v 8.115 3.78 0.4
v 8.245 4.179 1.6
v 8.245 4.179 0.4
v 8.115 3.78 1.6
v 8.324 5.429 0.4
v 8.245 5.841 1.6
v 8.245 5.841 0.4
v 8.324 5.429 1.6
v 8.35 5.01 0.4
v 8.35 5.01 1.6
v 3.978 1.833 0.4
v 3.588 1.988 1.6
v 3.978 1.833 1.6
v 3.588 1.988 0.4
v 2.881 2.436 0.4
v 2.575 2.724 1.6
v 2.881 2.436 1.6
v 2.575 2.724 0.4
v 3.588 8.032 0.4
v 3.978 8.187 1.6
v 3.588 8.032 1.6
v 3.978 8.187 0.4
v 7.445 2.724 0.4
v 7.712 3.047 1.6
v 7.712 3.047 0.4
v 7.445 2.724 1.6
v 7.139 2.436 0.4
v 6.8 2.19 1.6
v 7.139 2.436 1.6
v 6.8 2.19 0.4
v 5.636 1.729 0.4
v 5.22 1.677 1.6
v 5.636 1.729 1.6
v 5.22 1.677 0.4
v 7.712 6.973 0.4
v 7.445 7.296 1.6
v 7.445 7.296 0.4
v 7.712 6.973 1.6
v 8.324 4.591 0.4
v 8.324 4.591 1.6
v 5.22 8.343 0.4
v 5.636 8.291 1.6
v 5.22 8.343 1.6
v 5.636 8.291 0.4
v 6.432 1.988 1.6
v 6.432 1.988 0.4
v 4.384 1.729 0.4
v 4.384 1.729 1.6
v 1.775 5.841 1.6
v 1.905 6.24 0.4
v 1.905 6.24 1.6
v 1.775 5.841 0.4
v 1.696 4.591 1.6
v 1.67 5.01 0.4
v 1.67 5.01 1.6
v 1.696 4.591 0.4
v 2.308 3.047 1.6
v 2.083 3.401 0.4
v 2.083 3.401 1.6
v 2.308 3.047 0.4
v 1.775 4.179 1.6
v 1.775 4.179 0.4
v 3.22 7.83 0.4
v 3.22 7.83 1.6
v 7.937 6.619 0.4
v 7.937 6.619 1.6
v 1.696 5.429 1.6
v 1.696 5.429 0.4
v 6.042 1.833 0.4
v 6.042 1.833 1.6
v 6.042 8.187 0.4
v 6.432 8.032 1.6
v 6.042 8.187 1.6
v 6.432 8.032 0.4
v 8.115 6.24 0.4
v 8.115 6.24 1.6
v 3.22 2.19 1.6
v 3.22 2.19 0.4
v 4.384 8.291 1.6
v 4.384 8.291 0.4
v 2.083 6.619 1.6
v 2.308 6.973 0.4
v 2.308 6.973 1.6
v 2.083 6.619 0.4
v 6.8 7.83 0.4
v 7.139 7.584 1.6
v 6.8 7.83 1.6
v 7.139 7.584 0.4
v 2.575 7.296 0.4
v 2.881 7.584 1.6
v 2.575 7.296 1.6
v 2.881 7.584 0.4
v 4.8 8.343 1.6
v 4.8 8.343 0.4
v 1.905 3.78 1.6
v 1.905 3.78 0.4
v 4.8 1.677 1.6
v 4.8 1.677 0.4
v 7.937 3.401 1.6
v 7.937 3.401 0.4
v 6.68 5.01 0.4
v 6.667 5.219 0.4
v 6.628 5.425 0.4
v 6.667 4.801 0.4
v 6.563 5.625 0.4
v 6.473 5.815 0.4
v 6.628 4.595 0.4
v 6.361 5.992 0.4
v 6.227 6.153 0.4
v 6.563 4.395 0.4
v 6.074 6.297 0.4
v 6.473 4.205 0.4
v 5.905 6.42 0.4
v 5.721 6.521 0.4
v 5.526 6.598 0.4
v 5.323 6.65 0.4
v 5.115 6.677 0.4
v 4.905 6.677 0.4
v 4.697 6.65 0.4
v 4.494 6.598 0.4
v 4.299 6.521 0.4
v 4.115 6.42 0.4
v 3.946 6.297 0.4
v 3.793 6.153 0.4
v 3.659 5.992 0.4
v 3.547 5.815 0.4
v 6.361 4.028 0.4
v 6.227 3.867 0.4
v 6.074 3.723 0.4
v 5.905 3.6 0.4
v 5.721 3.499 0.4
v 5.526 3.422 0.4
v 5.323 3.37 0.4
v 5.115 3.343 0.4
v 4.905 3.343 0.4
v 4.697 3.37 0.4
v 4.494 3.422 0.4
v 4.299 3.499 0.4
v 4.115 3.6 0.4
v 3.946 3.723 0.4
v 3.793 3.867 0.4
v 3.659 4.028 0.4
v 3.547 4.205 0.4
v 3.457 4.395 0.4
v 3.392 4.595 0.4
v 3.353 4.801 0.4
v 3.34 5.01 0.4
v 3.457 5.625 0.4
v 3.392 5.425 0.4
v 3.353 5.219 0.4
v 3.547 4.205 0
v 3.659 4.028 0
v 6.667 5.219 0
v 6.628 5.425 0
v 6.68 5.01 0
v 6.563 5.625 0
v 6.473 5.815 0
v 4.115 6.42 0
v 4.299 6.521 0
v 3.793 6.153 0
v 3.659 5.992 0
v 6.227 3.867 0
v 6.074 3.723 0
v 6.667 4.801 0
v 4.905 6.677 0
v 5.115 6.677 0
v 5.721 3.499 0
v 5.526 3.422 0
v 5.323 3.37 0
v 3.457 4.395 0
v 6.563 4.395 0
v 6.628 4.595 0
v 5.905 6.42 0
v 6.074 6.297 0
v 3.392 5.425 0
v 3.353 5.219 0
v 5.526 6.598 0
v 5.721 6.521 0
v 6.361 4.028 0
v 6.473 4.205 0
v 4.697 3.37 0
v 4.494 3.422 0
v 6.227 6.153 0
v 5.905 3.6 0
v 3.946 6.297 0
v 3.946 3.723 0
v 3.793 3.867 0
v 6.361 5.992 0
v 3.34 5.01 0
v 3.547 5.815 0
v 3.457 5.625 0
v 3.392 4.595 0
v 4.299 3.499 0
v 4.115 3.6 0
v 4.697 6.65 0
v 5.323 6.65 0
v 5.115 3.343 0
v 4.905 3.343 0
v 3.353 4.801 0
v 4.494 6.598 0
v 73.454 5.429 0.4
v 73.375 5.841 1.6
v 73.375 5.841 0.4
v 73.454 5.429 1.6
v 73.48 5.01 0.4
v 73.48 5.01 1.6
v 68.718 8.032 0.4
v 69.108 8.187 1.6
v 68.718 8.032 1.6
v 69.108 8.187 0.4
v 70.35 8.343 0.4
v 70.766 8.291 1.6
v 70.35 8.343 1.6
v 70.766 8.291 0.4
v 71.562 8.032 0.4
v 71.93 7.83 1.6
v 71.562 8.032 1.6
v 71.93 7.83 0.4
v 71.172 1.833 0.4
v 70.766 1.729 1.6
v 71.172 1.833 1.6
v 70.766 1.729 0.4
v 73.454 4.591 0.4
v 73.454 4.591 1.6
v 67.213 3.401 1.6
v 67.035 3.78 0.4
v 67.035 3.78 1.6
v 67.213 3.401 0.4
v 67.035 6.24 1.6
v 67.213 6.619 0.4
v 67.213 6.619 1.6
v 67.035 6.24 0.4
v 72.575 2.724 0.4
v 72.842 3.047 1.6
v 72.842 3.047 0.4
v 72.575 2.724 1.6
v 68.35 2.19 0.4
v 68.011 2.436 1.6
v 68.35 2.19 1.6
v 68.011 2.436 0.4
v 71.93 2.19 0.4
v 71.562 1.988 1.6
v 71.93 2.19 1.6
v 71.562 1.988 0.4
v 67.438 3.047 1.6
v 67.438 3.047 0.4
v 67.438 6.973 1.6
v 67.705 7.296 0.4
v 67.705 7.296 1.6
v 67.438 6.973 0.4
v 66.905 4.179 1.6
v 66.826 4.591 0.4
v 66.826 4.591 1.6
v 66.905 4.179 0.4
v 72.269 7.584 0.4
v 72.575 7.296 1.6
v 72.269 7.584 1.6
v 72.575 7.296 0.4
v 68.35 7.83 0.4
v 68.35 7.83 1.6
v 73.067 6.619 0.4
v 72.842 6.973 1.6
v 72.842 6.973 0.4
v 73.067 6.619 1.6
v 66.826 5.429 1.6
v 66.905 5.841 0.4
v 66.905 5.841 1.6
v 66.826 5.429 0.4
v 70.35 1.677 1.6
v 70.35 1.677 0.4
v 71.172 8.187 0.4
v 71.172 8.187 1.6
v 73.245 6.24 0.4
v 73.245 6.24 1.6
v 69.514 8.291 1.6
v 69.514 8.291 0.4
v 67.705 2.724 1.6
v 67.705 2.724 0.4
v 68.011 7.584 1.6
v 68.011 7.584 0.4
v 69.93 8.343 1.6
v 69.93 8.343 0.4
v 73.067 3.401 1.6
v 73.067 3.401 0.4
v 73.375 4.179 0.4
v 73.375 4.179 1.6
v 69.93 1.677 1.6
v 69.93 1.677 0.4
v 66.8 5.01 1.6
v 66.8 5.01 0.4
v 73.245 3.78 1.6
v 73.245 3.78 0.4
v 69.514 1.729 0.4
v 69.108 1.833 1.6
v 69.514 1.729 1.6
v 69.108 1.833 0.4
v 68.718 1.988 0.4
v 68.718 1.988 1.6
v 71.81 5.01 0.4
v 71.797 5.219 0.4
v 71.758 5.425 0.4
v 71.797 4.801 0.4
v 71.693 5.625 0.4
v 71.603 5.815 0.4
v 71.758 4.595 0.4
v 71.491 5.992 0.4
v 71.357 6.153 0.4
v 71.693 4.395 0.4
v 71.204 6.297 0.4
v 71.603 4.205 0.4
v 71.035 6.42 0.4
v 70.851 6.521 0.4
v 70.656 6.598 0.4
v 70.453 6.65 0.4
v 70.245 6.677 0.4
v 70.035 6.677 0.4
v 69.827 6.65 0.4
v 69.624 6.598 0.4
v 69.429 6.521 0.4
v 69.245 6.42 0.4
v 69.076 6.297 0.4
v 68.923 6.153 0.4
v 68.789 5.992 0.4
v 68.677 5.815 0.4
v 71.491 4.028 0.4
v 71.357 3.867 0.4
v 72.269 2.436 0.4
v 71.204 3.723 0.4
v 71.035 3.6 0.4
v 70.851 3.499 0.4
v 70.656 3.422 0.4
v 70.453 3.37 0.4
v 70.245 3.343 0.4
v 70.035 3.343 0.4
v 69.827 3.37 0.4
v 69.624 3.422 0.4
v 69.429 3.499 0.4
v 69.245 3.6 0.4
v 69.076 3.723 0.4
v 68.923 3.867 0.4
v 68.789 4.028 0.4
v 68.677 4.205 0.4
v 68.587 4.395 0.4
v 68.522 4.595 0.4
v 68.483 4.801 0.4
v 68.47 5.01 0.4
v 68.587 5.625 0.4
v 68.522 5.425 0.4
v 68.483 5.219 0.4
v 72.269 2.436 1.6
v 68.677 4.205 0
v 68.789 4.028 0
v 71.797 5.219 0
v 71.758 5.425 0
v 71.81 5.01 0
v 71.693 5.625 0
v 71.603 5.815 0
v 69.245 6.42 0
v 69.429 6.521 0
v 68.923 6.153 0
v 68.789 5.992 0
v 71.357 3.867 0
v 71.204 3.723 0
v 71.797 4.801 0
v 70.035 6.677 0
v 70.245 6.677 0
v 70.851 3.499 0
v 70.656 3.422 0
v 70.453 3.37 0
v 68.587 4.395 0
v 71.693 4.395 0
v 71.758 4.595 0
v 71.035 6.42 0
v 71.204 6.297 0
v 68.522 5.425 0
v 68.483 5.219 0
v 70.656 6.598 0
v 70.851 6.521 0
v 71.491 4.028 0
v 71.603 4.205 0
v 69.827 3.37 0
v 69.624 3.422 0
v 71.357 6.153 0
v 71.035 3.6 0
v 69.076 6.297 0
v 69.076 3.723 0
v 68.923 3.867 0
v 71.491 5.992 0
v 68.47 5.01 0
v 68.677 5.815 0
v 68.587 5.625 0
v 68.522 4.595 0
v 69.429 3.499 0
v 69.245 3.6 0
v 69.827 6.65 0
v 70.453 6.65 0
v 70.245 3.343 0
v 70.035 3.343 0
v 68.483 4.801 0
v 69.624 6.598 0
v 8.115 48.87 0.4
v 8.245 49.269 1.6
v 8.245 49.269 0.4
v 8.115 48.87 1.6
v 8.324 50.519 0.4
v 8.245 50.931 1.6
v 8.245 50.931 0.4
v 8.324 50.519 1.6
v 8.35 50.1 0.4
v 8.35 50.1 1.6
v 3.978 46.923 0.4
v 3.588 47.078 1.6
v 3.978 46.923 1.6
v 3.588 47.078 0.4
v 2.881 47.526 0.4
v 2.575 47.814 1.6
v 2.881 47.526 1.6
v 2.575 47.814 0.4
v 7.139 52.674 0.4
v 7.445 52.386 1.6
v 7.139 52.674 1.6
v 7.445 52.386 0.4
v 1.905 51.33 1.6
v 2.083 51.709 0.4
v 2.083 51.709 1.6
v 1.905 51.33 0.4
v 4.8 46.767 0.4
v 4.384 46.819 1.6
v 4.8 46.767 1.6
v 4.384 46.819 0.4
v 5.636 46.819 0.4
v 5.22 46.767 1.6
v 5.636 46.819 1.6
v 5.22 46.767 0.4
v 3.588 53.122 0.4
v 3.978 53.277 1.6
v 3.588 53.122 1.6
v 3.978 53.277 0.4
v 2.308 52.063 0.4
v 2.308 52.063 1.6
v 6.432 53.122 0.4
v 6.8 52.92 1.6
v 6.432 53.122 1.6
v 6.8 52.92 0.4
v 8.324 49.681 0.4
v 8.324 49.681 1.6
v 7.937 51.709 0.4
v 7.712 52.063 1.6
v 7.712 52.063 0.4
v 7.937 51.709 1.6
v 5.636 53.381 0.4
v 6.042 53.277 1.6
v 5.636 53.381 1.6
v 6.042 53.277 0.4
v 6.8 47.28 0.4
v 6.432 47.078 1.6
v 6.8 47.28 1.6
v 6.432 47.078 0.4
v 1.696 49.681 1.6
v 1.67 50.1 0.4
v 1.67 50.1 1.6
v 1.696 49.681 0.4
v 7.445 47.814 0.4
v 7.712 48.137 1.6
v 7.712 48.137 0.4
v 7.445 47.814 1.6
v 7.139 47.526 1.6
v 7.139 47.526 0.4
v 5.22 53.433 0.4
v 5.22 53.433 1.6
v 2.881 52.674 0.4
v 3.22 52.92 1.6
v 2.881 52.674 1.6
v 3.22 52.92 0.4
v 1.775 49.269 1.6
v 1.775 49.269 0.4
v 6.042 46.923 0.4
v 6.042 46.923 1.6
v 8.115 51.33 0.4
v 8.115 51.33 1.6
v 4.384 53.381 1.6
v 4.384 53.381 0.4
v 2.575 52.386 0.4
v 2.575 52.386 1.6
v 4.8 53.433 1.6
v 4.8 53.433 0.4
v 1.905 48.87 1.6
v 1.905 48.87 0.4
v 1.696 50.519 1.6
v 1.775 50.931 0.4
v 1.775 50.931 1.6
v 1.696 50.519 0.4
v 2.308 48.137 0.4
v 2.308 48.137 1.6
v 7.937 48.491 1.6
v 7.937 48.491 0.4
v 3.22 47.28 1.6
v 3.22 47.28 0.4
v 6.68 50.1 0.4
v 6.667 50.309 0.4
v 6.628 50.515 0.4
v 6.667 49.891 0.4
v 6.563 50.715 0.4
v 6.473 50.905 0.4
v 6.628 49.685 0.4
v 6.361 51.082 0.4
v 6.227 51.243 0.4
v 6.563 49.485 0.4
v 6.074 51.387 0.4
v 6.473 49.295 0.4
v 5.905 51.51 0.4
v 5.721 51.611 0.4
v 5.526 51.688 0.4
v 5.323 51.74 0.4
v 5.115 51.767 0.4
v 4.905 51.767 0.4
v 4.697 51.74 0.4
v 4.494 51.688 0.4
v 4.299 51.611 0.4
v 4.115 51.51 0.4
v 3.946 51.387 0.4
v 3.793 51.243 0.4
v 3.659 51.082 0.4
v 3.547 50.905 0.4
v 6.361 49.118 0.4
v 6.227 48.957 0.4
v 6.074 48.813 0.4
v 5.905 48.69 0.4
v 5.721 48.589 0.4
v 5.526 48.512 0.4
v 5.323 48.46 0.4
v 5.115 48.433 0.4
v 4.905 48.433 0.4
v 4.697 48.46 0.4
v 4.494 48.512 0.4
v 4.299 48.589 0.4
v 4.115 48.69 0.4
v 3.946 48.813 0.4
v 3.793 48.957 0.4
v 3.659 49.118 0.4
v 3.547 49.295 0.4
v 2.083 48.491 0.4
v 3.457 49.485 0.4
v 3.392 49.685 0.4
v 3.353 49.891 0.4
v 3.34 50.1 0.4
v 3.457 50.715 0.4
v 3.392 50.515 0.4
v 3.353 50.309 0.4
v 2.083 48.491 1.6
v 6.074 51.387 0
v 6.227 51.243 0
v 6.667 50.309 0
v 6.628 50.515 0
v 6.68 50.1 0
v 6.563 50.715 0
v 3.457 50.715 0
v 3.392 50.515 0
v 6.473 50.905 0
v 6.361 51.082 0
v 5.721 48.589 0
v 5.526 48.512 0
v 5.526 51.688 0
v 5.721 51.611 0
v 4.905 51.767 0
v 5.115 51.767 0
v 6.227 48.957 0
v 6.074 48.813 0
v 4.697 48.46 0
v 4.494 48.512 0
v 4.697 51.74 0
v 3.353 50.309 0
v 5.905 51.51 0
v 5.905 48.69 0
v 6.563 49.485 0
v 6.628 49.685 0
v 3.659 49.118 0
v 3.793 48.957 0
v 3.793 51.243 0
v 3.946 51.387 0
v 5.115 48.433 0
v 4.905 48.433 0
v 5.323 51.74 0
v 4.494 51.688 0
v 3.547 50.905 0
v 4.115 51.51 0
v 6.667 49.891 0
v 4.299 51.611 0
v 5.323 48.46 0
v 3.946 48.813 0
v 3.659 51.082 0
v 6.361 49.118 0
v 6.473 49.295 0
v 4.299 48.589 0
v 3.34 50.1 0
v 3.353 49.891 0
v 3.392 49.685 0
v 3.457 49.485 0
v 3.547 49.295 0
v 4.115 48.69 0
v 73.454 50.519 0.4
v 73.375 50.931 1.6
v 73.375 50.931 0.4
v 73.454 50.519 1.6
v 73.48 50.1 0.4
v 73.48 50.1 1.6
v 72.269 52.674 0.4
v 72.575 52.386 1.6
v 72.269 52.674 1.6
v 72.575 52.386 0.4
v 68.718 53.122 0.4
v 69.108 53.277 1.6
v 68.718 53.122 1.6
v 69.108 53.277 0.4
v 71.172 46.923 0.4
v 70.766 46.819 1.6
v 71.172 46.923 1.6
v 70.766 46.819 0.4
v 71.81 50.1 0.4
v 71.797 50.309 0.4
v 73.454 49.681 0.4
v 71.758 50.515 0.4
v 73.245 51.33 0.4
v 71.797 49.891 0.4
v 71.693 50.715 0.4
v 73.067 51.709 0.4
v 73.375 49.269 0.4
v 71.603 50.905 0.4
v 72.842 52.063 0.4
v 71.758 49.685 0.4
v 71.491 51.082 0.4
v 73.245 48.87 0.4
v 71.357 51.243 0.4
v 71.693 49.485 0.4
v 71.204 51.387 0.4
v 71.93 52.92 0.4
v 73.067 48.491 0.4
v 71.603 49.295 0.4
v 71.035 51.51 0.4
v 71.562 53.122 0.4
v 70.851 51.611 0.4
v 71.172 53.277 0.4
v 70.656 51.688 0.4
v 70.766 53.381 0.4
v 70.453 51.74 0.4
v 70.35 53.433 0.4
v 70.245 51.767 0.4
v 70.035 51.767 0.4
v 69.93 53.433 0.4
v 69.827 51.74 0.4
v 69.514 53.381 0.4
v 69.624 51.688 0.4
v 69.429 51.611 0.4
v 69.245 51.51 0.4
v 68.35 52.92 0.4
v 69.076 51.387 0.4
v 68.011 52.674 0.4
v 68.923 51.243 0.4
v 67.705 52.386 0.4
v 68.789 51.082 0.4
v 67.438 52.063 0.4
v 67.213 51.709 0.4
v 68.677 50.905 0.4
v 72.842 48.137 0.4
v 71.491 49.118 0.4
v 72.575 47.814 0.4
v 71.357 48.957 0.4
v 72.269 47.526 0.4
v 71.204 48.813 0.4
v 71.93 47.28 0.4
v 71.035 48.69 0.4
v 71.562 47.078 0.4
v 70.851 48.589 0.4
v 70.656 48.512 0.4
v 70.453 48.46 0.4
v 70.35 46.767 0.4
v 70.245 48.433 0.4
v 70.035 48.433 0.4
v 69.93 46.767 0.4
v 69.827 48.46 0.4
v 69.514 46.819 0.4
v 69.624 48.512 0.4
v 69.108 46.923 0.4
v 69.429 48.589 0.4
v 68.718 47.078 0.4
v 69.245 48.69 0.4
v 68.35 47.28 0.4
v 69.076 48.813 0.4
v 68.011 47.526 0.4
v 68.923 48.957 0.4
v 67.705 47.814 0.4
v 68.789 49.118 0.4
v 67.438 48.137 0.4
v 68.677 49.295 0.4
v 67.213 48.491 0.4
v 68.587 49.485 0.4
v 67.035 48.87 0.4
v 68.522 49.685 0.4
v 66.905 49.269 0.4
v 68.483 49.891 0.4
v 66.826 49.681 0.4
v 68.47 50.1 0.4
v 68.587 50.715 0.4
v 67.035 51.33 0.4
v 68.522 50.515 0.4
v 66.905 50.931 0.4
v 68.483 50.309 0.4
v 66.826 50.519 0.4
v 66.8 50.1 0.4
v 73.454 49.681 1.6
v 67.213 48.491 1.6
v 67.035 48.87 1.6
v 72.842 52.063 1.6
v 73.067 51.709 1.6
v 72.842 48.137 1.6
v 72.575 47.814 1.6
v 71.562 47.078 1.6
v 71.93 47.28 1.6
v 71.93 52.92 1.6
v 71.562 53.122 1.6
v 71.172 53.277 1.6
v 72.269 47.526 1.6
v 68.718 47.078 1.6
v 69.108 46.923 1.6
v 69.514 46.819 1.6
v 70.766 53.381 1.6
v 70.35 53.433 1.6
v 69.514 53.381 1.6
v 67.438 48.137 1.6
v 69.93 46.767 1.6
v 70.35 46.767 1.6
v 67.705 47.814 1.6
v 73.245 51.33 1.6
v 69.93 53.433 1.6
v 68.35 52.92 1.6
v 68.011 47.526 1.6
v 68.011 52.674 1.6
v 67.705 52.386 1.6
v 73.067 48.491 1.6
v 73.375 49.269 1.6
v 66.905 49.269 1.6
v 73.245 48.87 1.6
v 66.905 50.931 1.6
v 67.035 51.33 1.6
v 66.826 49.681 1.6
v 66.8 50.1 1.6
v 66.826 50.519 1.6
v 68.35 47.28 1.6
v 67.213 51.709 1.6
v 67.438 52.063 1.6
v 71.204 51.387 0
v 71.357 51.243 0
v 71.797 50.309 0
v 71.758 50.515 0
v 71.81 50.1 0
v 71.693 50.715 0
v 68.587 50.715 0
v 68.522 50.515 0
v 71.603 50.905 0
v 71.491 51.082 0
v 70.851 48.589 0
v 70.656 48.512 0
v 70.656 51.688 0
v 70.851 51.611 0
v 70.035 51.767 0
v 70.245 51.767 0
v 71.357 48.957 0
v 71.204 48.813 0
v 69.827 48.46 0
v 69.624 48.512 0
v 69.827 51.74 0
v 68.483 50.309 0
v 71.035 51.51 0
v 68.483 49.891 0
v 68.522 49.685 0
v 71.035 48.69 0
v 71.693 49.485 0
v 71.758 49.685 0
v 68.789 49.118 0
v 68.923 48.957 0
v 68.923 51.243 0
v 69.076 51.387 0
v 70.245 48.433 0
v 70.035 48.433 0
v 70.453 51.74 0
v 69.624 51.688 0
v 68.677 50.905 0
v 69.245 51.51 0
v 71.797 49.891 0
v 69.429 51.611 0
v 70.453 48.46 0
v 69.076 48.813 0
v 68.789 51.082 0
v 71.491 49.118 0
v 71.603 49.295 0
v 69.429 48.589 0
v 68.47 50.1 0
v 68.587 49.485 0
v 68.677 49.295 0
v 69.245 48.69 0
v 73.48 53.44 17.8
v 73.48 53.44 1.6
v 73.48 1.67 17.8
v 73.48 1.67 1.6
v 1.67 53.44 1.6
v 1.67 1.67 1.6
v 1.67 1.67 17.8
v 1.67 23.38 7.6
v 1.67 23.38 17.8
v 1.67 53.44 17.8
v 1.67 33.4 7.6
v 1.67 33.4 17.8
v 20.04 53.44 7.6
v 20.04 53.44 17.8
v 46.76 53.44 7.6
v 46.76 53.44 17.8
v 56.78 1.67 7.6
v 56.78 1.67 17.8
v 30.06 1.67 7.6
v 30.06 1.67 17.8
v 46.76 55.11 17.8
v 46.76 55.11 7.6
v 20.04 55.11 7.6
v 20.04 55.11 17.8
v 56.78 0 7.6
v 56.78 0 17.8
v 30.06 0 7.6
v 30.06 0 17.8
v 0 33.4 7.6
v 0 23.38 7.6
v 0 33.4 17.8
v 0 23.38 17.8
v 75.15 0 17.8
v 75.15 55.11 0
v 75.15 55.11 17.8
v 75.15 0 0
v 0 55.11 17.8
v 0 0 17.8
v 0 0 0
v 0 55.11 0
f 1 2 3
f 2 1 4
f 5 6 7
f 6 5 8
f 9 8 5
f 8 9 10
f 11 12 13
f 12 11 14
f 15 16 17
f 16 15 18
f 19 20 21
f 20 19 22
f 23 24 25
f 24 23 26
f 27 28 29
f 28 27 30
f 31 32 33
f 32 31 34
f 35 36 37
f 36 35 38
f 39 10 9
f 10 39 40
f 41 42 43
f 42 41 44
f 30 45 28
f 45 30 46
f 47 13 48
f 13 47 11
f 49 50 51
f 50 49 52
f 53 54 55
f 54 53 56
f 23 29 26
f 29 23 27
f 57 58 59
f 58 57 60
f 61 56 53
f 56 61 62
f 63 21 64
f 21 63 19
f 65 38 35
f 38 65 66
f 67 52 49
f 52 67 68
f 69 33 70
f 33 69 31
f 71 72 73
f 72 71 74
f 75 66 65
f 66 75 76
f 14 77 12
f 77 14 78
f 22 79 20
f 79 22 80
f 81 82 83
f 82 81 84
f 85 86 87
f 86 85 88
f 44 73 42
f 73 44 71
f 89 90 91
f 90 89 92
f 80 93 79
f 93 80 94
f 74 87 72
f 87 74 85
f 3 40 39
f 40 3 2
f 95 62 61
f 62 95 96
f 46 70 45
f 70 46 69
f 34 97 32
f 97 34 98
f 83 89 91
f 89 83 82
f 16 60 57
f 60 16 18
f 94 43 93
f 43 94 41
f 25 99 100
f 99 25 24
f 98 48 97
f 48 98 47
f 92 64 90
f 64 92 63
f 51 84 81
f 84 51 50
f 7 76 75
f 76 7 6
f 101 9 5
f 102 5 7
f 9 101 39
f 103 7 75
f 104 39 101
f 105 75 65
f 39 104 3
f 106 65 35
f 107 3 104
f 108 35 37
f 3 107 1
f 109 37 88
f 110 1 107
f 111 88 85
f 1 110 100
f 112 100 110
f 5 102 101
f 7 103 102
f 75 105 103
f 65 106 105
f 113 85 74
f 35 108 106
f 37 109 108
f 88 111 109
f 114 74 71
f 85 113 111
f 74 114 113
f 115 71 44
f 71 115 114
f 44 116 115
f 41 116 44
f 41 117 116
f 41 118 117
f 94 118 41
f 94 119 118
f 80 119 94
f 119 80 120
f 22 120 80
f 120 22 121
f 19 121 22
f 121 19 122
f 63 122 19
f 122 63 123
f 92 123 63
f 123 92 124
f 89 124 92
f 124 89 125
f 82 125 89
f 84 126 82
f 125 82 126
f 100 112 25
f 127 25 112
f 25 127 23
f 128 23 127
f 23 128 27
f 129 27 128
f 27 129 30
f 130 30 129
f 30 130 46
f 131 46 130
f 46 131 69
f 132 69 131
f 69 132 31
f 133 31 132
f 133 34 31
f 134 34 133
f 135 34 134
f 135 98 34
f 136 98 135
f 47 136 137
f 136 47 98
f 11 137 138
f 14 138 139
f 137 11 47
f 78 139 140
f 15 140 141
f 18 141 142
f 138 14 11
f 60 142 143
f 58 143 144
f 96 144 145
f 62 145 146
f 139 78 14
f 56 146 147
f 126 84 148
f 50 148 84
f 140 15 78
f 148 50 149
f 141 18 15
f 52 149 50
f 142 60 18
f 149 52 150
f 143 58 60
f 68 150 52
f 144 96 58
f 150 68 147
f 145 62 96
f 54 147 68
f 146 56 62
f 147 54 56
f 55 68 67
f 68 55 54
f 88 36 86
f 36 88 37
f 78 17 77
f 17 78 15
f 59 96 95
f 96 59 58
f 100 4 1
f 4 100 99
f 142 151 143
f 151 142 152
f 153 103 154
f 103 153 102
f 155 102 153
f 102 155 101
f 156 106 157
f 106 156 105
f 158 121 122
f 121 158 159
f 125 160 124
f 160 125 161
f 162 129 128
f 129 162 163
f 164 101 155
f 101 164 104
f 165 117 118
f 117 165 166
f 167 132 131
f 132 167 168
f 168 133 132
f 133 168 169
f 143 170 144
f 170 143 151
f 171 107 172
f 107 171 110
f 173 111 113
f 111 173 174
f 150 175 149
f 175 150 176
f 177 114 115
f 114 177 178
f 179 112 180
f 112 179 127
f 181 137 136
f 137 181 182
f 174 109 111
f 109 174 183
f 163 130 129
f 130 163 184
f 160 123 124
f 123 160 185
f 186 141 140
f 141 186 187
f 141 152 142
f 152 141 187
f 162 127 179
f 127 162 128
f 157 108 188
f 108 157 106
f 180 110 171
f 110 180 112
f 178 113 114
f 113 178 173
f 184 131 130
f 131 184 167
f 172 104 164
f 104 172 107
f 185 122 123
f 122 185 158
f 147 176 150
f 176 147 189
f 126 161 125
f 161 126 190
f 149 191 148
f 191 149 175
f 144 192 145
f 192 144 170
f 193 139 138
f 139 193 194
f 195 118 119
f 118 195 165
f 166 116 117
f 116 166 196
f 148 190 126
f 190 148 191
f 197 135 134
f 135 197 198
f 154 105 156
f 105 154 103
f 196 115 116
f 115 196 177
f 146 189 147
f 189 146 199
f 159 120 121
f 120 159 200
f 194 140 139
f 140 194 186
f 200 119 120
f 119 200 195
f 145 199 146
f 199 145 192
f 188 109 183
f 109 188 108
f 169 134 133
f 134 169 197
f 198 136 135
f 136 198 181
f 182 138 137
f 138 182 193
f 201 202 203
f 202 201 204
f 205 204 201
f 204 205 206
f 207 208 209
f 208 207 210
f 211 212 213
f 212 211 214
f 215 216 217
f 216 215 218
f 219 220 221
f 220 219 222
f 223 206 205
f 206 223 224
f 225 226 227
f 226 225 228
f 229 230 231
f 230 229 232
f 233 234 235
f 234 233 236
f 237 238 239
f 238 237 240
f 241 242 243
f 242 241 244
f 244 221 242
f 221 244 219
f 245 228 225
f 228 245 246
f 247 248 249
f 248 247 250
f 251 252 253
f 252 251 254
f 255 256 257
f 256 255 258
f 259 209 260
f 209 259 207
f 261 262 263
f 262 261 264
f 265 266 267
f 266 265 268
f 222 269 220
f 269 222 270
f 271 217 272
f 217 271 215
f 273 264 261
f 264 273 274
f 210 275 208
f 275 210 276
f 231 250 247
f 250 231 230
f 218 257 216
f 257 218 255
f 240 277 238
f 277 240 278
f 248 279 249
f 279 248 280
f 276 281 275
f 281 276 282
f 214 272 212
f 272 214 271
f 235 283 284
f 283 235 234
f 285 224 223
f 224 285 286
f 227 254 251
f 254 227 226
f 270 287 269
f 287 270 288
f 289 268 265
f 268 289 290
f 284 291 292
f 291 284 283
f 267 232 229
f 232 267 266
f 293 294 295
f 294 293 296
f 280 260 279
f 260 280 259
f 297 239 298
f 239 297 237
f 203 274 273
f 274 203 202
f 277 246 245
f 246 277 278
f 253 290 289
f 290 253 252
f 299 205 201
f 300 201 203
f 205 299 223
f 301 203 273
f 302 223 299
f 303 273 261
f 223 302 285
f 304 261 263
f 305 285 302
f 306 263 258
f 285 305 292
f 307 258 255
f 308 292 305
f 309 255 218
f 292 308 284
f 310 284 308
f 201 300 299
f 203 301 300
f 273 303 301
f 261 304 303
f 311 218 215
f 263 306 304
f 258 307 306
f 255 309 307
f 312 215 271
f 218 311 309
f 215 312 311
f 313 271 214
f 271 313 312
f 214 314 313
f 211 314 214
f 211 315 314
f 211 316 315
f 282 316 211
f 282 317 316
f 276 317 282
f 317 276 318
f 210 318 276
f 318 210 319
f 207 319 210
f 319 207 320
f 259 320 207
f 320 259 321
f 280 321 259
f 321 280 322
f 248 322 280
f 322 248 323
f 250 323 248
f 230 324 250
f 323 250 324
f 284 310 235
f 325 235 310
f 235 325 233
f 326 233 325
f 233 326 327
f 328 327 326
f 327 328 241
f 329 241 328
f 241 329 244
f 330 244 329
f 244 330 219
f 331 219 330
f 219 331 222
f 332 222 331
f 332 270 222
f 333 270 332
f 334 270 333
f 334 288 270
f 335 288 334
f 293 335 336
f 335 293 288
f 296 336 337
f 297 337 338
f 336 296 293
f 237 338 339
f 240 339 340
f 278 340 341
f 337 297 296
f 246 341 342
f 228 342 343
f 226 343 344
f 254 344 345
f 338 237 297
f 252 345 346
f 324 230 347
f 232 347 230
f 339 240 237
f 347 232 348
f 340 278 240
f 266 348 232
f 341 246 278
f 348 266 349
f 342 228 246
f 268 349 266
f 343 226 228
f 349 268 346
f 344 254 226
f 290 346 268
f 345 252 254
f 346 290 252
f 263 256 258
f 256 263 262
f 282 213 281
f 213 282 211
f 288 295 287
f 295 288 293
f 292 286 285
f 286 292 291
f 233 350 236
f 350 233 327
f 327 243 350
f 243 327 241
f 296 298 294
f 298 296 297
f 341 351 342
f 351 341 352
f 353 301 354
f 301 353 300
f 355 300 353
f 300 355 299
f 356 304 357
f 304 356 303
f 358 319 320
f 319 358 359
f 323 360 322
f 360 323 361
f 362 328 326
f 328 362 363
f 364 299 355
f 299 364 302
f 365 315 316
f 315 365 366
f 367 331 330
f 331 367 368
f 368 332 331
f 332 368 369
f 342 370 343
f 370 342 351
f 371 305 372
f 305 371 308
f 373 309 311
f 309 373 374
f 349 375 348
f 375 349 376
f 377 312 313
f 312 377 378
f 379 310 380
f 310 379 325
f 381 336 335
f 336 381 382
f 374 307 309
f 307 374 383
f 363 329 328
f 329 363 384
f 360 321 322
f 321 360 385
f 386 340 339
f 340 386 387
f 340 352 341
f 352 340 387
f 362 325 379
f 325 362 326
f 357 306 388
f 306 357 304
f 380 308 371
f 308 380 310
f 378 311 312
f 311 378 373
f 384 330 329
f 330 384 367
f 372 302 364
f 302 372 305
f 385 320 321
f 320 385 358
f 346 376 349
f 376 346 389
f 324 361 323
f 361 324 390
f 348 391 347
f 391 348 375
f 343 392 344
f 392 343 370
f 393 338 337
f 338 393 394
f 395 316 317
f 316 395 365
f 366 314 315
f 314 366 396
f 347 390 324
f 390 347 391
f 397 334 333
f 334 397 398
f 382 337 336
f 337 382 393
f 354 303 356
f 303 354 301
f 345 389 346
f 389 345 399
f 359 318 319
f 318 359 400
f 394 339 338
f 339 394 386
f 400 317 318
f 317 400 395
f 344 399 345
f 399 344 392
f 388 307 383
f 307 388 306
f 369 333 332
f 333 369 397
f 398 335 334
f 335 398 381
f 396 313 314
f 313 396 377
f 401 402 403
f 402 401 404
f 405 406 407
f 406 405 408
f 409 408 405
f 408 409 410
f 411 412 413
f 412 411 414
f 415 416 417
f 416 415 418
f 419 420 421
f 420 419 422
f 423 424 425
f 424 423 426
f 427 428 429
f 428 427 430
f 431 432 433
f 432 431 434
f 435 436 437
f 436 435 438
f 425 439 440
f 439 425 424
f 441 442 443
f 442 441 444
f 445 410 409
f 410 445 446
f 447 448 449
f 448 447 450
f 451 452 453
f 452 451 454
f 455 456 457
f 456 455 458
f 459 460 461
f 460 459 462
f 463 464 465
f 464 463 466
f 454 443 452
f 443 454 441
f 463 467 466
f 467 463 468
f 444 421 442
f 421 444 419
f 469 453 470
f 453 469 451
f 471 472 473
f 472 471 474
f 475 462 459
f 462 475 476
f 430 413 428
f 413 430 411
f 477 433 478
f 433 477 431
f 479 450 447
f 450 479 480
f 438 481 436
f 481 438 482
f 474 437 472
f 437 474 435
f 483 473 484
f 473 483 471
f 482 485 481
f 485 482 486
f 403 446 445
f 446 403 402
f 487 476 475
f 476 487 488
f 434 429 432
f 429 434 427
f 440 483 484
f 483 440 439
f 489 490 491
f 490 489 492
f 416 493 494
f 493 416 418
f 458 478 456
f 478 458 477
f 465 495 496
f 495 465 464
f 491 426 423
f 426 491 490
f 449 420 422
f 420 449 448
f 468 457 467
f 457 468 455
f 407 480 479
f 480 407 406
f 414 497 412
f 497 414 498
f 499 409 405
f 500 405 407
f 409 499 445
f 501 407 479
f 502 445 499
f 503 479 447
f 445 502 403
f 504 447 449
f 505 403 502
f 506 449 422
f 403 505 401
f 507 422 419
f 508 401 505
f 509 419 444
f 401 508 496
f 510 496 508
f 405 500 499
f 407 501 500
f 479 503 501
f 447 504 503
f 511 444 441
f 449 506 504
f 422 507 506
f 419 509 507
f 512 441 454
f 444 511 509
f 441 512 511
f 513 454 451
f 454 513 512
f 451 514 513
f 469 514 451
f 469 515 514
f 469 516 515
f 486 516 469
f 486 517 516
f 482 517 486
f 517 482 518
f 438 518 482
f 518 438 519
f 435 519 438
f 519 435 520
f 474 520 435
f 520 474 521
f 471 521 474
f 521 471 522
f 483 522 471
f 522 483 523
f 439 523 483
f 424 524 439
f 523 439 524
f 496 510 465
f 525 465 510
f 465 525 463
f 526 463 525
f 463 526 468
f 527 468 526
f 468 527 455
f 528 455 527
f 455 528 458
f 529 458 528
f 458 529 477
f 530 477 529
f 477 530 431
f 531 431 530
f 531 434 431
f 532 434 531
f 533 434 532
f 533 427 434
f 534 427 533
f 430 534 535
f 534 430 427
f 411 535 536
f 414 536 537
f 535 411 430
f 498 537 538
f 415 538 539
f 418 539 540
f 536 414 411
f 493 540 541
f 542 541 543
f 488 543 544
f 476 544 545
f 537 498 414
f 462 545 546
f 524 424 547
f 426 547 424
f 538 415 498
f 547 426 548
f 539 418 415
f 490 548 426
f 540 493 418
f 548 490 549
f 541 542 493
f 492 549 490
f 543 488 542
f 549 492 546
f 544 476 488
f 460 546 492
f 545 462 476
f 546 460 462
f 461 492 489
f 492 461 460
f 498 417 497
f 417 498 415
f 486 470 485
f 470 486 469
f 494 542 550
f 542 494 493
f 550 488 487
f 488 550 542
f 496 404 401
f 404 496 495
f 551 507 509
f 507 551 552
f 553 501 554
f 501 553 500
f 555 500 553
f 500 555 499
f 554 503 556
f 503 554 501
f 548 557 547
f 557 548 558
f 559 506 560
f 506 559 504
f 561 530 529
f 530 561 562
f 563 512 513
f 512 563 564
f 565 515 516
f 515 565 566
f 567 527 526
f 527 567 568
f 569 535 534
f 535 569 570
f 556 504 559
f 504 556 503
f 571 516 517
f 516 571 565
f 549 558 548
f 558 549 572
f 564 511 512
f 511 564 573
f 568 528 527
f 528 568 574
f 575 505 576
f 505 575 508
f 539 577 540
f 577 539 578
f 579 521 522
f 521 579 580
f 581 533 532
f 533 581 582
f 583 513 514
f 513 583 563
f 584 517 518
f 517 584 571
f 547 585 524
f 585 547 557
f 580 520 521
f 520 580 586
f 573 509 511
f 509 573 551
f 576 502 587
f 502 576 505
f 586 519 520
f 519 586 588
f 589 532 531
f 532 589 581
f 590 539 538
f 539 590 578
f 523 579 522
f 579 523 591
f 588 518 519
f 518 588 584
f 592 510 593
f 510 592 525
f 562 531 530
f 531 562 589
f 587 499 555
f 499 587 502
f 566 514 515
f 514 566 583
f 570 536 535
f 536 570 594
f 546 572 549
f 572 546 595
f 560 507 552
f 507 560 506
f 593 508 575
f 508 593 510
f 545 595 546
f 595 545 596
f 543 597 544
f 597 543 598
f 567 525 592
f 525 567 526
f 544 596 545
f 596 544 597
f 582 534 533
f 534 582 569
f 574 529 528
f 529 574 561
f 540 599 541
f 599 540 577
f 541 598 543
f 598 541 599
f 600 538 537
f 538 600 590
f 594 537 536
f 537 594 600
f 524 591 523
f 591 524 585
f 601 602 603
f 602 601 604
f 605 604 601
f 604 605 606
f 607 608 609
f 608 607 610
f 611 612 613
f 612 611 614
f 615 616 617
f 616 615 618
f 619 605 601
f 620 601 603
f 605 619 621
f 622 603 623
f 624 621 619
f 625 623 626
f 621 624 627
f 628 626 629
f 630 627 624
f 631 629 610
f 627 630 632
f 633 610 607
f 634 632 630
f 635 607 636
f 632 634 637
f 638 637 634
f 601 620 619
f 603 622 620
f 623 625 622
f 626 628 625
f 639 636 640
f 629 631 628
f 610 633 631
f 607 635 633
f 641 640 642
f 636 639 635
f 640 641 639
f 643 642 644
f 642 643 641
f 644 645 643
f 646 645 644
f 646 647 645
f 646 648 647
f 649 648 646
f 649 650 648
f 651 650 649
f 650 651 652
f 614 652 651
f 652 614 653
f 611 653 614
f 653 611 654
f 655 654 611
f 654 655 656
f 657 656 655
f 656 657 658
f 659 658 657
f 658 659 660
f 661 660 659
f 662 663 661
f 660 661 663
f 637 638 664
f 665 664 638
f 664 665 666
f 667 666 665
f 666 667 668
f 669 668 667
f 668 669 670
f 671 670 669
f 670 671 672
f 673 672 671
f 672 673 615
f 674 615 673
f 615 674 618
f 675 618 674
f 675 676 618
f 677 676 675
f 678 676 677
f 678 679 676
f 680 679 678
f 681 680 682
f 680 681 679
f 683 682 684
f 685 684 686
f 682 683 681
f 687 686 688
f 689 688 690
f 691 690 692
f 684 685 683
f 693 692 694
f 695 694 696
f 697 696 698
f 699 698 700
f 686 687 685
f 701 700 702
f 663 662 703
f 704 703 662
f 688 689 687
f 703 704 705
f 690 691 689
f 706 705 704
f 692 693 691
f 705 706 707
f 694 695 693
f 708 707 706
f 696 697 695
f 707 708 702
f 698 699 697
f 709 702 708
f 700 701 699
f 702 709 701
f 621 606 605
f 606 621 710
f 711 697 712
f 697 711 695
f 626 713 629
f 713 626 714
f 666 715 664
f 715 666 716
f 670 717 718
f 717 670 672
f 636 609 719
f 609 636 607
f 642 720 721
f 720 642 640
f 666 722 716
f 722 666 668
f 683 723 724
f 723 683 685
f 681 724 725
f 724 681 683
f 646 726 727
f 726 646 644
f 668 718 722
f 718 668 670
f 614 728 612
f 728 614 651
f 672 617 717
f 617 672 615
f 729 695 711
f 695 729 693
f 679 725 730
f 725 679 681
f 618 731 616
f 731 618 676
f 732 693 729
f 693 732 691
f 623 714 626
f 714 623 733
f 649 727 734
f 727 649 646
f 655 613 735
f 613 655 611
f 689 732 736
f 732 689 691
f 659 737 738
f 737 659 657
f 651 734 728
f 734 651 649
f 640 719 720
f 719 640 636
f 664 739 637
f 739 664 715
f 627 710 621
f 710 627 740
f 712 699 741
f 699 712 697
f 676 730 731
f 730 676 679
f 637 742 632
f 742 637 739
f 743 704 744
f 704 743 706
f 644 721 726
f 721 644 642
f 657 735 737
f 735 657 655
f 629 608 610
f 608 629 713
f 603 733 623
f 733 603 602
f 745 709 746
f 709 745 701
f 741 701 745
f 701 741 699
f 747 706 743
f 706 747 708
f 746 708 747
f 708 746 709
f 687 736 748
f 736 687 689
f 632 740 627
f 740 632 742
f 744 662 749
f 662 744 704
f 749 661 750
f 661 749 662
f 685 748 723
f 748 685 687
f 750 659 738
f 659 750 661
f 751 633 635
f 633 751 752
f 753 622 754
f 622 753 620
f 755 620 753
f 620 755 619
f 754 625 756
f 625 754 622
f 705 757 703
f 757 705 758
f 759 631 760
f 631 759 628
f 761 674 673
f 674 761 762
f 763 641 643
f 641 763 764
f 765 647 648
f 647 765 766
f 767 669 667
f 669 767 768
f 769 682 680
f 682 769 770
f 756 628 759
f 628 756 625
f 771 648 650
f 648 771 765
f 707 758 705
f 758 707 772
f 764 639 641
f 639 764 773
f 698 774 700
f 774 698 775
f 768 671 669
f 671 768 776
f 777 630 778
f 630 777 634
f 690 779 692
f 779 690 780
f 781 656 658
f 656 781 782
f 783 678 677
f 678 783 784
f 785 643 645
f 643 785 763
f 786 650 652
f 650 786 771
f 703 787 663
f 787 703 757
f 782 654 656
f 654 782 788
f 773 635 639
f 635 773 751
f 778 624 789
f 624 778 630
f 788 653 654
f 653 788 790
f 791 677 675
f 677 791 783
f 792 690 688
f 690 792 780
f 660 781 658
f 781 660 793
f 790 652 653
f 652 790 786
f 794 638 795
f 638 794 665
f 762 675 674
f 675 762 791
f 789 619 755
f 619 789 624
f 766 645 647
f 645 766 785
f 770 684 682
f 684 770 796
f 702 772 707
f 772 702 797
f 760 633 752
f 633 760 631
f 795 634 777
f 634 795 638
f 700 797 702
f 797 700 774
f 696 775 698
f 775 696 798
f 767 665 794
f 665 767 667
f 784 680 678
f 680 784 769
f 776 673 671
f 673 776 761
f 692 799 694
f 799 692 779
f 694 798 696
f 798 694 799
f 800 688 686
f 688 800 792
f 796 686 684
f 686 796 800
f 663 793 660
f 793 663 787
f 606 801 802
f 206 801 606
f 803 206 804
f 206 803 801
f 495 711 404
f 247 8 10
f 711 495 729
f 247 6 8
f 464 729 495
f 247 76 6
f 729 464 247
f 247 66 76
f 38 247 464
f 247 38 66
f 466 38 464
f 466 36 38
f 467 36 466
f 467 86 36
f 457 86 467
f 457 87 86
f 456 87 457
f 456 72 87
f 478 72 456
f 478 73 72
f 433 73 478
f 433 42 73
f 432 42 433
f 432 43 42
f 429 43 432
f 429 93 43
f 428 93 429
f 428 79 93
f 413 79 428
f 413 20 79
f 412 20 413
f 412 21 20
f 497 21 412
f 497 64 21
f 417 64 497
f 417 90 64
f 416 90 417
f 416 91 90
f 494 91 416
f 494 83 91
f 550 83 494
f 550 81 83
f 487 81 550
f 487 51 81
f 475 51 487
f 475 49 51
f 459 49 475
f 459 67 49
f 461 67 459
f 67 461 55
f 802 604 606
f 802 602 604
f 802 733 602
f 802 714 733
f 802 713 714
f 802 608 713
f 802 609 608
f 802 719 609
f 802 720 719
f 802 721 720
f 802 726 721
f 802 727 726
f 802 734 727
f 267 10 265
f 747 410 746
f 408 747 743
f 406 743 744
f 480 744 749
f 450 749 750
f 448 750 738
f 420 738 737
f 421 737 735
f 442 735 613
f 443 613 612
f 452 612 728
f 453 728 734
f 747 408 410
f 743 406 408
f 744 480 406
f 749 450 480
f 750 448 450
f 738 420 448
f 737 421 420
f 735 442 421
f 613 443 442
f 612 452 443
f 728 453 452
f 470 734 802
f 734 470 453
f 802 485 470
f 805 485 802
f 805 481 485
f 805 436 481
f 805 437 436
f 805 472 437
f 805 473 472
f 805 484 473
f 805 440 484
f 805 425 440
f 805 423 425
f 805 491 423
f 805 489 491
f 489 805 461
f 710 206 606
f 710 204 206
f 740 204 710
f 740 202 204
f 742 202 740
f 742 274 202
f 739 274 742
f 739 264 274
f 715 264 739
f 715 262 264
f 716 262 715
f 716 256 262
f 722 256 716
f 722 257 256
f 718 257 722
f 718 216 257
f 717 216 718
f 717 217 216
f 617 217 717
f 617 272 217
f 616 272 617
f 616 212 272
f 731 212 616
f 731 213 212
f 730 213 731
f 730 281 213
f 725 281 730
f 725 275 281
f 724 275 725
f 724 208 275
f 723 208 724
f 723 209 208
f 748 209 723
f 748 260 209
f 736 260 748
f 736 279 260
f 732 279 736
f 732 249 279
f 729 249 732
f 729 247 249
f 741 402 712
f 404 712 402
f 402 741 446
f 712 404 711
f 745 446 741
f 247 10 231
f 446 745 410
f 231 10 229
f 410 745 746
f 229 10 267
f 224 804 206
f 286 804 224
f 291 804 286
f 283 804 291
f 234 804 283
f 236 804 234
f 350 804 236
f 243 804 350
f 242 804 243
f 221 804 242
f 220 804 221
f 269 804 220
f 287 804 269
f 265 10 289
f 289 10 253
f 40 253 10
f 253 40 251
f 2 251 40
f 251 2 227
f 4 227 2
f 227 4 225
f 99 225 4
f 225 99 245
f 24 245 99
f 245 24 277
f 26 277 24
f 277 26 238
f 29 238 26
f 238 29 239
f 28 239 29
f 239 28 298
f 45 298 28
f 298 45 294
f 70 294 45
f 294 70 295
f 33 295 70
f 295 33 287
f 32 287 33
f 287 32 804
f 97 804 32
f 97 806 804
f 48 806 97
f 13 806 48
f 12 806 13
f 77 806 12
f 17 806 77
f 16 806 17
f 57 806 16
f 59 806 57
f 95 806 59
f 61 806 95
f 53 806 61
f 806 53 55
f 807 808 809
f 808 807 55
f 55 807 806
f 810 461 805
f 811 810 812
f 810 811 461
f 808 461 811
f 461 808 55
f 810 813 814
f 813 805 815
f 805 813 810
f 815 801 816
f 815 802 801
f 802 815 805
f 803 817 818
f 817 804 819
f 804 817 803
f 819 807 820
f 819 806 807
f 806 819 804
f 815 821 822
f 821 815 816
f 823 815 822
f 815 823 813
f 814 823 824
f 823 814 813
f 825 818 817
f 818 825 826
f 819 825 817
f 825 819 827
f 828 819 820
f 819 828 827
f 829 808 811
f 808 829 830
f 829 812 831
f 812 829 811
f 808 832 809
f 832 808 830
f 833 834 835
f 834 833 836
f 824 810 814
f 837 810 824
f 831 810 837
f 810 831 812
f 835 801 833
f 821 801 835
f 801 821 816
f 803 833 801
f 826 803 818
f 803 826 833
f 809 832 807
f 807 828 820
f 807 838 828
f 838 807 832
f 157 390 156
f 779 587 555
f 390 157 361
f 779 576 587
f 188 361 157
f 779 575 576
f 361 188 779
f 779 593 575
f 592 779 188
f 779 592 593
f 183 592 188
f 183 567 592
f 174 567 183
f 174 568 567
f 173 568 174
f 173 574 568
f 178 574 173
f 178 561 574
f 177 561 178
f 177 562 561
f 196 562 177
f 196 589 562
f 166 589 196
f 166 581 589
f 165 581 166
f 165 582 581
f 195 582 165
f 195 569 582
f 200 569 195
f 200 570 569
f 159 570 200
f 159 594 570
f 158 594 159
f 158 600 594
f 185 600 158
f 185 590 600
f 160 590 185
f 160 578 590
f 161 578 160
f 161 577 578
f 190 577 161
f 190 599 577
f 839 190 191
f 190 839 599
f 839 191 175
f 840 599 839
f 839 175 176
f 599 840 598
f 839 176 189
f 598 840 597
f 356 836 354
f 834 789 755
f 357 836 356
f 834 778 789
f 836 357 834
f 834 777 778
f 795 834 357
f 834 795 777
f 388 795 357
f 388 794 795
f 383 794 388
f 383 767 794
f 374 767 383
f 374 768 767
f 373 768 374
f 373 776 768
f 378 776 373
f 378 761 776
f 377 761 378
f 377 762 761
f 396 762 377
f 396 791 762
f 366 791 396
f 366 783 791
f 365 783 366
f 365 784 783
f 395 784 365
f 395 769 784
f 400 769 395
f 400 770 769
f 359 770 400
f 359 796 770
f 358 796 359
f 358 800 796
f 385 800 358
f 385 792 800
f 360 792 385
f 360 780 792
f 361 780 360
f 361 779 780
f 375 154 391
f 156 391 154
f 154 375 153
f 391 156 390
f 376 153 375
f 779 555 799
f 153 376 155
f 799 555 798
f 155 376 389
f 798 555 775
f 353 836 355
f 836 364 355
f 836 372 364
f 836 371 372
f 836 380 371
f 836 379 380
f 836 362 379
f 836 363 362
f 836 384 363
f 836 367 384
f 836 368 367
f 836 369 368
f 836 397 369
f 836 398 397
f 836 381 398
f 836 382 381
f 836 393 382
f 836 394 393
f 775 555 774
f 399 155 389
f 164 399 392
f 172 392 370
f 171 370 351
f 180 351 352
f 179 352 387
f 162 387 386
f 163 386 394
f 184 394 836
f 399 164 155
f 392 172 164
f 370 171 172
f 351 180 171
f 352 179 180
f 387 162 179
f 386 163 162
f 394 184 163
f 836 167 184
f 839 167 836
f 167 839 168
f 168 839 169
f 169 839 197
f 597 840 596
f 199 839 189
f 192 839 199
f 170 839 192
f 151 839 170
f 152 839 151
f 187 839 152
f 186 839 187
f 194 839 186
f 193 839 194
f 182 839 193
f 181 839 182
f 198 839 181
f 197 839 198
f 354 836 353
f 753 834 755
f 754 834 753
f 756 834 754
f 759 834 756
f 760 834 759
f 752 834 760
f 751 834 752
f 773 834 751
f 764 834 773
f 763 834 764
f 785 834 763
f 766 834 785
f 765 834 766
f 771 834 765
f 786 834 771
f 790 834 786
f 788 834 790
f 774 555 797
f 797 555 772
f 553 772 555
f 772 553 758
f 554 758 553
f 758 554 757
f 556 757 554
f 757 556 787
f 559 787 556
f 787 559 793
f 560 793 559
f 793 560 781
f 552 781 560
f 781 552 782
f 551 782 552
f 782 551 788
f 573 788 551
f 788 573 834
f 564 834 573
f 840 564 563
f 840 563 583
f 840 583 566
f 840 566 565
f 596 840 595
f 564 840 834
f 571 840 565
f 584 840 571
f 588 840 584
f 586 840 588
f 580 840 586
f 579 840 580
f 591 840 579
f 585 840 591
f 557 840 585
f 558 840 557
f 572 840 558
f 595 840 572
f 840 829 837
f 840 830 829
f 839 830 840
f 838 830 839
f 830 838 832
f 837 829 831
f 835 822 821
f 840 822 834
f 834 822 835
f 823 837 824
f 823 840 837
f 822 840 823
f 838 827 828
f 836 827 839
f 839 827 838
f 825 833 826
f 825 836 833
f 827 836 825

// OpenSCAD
first_layer_height = 0.4;
layer_height = 0.6;

bottom_width = first_layer_height + 2*layer_height;
top_width = 2*layer_height;
wall_width = 1.67;

function xy_dim_adj(x) = ceil(x/wall_width)*wall_width;
function  z_dim_adj(z) = ceil(z/layer_height)*layer_height;

box_l = 71;
box_w = 51;
box_h = 16;
box_bt_h = 6;
cap_h = 4;

box_l_adj = xy_dim_adj(box_l);
box_w_adj = xy_dim_adj(box_w);
box_h_adj = z_dim_adj(box_h);
box_bt_h_adj = z_dim_adj(box_bt_h);
cap_h_adj = z_dim_adj(cap_h);

screws_hd = 5.55;
screws_hh = 2.38;
screws_hd_offset = first_layer_height;
screws_d = 3;
screws_xy = [
  [            3*wall_width, 3*wall_width],
  [box_l_adj - 1*wall_width, 3*wall_width],
  [            3*wall_width, box_w_adj-1*wall_width],
  [box_l_adj - 1*wall_width, box_w_adj-1*wall_width]
];

screws_hd_adj = xy_dim_adj(screws_hd);
screws_d_adj = xy_dim_adj(screws_d);

difference() {
  cube([box_l_adj+2*wall_width, box_w_adj+2*wall_width, box_h_adj+bottom_width]);
  union() {
    translate([wall_width, wall_width, bottom_width])
      cube([box_l_adj, box_w_adj, box_h_adj+bottom_width]);
    
    translate([xy_dim_adj(17)+wall_width, box_w_adj, bottom_width+box_bt_h_adj])
      cube([xy_dim_adj(26), 3*wall_width, box_h_adj+bottom_width]);
    translate([xy_dim_adj(27)+wall_width, -wall_width, bottom_width+box_bt_h_adj])
      cube([xy_dim_adj(26), 3*wall_width, box_h_adj+bottom_width]);
      
    translate([-wall_width, xy_dim_adj(21)+wall_width,, bottom_width+box_bt_h_adj])
      cube([3*wall_width, xy_dim_adj(10), box_h_adj+bottom_width]);
    
    for(xy = screws_xy) {
      translate([xy[0], xy[1], screws_hd_offset])
        cylinder(h=bottom_width, d=screws_hd_adj, $fn=50, center=false);
      translate([xy[0], xy[1], 0])
        cylinder(h=3*bottom_width, d=screws_d_adj, $fn=50, center=true);
    }
  }
}

// cap
*translate([-box_l_adj-4*wall_width, 0, 0])
difference() {
  translate([-wall_width, -wall_width, 0])
    cube([box_l_adj+4*wall_width, box_w_adj+4*wall_width, cap_h_adj+bottom_width]);
  translate([0, 0, bottom_width])
    cube([box_l_adj+2*wall_width, box_w_adj+2*wall_width, cap_h_adj+2*bottom_width]);
}
